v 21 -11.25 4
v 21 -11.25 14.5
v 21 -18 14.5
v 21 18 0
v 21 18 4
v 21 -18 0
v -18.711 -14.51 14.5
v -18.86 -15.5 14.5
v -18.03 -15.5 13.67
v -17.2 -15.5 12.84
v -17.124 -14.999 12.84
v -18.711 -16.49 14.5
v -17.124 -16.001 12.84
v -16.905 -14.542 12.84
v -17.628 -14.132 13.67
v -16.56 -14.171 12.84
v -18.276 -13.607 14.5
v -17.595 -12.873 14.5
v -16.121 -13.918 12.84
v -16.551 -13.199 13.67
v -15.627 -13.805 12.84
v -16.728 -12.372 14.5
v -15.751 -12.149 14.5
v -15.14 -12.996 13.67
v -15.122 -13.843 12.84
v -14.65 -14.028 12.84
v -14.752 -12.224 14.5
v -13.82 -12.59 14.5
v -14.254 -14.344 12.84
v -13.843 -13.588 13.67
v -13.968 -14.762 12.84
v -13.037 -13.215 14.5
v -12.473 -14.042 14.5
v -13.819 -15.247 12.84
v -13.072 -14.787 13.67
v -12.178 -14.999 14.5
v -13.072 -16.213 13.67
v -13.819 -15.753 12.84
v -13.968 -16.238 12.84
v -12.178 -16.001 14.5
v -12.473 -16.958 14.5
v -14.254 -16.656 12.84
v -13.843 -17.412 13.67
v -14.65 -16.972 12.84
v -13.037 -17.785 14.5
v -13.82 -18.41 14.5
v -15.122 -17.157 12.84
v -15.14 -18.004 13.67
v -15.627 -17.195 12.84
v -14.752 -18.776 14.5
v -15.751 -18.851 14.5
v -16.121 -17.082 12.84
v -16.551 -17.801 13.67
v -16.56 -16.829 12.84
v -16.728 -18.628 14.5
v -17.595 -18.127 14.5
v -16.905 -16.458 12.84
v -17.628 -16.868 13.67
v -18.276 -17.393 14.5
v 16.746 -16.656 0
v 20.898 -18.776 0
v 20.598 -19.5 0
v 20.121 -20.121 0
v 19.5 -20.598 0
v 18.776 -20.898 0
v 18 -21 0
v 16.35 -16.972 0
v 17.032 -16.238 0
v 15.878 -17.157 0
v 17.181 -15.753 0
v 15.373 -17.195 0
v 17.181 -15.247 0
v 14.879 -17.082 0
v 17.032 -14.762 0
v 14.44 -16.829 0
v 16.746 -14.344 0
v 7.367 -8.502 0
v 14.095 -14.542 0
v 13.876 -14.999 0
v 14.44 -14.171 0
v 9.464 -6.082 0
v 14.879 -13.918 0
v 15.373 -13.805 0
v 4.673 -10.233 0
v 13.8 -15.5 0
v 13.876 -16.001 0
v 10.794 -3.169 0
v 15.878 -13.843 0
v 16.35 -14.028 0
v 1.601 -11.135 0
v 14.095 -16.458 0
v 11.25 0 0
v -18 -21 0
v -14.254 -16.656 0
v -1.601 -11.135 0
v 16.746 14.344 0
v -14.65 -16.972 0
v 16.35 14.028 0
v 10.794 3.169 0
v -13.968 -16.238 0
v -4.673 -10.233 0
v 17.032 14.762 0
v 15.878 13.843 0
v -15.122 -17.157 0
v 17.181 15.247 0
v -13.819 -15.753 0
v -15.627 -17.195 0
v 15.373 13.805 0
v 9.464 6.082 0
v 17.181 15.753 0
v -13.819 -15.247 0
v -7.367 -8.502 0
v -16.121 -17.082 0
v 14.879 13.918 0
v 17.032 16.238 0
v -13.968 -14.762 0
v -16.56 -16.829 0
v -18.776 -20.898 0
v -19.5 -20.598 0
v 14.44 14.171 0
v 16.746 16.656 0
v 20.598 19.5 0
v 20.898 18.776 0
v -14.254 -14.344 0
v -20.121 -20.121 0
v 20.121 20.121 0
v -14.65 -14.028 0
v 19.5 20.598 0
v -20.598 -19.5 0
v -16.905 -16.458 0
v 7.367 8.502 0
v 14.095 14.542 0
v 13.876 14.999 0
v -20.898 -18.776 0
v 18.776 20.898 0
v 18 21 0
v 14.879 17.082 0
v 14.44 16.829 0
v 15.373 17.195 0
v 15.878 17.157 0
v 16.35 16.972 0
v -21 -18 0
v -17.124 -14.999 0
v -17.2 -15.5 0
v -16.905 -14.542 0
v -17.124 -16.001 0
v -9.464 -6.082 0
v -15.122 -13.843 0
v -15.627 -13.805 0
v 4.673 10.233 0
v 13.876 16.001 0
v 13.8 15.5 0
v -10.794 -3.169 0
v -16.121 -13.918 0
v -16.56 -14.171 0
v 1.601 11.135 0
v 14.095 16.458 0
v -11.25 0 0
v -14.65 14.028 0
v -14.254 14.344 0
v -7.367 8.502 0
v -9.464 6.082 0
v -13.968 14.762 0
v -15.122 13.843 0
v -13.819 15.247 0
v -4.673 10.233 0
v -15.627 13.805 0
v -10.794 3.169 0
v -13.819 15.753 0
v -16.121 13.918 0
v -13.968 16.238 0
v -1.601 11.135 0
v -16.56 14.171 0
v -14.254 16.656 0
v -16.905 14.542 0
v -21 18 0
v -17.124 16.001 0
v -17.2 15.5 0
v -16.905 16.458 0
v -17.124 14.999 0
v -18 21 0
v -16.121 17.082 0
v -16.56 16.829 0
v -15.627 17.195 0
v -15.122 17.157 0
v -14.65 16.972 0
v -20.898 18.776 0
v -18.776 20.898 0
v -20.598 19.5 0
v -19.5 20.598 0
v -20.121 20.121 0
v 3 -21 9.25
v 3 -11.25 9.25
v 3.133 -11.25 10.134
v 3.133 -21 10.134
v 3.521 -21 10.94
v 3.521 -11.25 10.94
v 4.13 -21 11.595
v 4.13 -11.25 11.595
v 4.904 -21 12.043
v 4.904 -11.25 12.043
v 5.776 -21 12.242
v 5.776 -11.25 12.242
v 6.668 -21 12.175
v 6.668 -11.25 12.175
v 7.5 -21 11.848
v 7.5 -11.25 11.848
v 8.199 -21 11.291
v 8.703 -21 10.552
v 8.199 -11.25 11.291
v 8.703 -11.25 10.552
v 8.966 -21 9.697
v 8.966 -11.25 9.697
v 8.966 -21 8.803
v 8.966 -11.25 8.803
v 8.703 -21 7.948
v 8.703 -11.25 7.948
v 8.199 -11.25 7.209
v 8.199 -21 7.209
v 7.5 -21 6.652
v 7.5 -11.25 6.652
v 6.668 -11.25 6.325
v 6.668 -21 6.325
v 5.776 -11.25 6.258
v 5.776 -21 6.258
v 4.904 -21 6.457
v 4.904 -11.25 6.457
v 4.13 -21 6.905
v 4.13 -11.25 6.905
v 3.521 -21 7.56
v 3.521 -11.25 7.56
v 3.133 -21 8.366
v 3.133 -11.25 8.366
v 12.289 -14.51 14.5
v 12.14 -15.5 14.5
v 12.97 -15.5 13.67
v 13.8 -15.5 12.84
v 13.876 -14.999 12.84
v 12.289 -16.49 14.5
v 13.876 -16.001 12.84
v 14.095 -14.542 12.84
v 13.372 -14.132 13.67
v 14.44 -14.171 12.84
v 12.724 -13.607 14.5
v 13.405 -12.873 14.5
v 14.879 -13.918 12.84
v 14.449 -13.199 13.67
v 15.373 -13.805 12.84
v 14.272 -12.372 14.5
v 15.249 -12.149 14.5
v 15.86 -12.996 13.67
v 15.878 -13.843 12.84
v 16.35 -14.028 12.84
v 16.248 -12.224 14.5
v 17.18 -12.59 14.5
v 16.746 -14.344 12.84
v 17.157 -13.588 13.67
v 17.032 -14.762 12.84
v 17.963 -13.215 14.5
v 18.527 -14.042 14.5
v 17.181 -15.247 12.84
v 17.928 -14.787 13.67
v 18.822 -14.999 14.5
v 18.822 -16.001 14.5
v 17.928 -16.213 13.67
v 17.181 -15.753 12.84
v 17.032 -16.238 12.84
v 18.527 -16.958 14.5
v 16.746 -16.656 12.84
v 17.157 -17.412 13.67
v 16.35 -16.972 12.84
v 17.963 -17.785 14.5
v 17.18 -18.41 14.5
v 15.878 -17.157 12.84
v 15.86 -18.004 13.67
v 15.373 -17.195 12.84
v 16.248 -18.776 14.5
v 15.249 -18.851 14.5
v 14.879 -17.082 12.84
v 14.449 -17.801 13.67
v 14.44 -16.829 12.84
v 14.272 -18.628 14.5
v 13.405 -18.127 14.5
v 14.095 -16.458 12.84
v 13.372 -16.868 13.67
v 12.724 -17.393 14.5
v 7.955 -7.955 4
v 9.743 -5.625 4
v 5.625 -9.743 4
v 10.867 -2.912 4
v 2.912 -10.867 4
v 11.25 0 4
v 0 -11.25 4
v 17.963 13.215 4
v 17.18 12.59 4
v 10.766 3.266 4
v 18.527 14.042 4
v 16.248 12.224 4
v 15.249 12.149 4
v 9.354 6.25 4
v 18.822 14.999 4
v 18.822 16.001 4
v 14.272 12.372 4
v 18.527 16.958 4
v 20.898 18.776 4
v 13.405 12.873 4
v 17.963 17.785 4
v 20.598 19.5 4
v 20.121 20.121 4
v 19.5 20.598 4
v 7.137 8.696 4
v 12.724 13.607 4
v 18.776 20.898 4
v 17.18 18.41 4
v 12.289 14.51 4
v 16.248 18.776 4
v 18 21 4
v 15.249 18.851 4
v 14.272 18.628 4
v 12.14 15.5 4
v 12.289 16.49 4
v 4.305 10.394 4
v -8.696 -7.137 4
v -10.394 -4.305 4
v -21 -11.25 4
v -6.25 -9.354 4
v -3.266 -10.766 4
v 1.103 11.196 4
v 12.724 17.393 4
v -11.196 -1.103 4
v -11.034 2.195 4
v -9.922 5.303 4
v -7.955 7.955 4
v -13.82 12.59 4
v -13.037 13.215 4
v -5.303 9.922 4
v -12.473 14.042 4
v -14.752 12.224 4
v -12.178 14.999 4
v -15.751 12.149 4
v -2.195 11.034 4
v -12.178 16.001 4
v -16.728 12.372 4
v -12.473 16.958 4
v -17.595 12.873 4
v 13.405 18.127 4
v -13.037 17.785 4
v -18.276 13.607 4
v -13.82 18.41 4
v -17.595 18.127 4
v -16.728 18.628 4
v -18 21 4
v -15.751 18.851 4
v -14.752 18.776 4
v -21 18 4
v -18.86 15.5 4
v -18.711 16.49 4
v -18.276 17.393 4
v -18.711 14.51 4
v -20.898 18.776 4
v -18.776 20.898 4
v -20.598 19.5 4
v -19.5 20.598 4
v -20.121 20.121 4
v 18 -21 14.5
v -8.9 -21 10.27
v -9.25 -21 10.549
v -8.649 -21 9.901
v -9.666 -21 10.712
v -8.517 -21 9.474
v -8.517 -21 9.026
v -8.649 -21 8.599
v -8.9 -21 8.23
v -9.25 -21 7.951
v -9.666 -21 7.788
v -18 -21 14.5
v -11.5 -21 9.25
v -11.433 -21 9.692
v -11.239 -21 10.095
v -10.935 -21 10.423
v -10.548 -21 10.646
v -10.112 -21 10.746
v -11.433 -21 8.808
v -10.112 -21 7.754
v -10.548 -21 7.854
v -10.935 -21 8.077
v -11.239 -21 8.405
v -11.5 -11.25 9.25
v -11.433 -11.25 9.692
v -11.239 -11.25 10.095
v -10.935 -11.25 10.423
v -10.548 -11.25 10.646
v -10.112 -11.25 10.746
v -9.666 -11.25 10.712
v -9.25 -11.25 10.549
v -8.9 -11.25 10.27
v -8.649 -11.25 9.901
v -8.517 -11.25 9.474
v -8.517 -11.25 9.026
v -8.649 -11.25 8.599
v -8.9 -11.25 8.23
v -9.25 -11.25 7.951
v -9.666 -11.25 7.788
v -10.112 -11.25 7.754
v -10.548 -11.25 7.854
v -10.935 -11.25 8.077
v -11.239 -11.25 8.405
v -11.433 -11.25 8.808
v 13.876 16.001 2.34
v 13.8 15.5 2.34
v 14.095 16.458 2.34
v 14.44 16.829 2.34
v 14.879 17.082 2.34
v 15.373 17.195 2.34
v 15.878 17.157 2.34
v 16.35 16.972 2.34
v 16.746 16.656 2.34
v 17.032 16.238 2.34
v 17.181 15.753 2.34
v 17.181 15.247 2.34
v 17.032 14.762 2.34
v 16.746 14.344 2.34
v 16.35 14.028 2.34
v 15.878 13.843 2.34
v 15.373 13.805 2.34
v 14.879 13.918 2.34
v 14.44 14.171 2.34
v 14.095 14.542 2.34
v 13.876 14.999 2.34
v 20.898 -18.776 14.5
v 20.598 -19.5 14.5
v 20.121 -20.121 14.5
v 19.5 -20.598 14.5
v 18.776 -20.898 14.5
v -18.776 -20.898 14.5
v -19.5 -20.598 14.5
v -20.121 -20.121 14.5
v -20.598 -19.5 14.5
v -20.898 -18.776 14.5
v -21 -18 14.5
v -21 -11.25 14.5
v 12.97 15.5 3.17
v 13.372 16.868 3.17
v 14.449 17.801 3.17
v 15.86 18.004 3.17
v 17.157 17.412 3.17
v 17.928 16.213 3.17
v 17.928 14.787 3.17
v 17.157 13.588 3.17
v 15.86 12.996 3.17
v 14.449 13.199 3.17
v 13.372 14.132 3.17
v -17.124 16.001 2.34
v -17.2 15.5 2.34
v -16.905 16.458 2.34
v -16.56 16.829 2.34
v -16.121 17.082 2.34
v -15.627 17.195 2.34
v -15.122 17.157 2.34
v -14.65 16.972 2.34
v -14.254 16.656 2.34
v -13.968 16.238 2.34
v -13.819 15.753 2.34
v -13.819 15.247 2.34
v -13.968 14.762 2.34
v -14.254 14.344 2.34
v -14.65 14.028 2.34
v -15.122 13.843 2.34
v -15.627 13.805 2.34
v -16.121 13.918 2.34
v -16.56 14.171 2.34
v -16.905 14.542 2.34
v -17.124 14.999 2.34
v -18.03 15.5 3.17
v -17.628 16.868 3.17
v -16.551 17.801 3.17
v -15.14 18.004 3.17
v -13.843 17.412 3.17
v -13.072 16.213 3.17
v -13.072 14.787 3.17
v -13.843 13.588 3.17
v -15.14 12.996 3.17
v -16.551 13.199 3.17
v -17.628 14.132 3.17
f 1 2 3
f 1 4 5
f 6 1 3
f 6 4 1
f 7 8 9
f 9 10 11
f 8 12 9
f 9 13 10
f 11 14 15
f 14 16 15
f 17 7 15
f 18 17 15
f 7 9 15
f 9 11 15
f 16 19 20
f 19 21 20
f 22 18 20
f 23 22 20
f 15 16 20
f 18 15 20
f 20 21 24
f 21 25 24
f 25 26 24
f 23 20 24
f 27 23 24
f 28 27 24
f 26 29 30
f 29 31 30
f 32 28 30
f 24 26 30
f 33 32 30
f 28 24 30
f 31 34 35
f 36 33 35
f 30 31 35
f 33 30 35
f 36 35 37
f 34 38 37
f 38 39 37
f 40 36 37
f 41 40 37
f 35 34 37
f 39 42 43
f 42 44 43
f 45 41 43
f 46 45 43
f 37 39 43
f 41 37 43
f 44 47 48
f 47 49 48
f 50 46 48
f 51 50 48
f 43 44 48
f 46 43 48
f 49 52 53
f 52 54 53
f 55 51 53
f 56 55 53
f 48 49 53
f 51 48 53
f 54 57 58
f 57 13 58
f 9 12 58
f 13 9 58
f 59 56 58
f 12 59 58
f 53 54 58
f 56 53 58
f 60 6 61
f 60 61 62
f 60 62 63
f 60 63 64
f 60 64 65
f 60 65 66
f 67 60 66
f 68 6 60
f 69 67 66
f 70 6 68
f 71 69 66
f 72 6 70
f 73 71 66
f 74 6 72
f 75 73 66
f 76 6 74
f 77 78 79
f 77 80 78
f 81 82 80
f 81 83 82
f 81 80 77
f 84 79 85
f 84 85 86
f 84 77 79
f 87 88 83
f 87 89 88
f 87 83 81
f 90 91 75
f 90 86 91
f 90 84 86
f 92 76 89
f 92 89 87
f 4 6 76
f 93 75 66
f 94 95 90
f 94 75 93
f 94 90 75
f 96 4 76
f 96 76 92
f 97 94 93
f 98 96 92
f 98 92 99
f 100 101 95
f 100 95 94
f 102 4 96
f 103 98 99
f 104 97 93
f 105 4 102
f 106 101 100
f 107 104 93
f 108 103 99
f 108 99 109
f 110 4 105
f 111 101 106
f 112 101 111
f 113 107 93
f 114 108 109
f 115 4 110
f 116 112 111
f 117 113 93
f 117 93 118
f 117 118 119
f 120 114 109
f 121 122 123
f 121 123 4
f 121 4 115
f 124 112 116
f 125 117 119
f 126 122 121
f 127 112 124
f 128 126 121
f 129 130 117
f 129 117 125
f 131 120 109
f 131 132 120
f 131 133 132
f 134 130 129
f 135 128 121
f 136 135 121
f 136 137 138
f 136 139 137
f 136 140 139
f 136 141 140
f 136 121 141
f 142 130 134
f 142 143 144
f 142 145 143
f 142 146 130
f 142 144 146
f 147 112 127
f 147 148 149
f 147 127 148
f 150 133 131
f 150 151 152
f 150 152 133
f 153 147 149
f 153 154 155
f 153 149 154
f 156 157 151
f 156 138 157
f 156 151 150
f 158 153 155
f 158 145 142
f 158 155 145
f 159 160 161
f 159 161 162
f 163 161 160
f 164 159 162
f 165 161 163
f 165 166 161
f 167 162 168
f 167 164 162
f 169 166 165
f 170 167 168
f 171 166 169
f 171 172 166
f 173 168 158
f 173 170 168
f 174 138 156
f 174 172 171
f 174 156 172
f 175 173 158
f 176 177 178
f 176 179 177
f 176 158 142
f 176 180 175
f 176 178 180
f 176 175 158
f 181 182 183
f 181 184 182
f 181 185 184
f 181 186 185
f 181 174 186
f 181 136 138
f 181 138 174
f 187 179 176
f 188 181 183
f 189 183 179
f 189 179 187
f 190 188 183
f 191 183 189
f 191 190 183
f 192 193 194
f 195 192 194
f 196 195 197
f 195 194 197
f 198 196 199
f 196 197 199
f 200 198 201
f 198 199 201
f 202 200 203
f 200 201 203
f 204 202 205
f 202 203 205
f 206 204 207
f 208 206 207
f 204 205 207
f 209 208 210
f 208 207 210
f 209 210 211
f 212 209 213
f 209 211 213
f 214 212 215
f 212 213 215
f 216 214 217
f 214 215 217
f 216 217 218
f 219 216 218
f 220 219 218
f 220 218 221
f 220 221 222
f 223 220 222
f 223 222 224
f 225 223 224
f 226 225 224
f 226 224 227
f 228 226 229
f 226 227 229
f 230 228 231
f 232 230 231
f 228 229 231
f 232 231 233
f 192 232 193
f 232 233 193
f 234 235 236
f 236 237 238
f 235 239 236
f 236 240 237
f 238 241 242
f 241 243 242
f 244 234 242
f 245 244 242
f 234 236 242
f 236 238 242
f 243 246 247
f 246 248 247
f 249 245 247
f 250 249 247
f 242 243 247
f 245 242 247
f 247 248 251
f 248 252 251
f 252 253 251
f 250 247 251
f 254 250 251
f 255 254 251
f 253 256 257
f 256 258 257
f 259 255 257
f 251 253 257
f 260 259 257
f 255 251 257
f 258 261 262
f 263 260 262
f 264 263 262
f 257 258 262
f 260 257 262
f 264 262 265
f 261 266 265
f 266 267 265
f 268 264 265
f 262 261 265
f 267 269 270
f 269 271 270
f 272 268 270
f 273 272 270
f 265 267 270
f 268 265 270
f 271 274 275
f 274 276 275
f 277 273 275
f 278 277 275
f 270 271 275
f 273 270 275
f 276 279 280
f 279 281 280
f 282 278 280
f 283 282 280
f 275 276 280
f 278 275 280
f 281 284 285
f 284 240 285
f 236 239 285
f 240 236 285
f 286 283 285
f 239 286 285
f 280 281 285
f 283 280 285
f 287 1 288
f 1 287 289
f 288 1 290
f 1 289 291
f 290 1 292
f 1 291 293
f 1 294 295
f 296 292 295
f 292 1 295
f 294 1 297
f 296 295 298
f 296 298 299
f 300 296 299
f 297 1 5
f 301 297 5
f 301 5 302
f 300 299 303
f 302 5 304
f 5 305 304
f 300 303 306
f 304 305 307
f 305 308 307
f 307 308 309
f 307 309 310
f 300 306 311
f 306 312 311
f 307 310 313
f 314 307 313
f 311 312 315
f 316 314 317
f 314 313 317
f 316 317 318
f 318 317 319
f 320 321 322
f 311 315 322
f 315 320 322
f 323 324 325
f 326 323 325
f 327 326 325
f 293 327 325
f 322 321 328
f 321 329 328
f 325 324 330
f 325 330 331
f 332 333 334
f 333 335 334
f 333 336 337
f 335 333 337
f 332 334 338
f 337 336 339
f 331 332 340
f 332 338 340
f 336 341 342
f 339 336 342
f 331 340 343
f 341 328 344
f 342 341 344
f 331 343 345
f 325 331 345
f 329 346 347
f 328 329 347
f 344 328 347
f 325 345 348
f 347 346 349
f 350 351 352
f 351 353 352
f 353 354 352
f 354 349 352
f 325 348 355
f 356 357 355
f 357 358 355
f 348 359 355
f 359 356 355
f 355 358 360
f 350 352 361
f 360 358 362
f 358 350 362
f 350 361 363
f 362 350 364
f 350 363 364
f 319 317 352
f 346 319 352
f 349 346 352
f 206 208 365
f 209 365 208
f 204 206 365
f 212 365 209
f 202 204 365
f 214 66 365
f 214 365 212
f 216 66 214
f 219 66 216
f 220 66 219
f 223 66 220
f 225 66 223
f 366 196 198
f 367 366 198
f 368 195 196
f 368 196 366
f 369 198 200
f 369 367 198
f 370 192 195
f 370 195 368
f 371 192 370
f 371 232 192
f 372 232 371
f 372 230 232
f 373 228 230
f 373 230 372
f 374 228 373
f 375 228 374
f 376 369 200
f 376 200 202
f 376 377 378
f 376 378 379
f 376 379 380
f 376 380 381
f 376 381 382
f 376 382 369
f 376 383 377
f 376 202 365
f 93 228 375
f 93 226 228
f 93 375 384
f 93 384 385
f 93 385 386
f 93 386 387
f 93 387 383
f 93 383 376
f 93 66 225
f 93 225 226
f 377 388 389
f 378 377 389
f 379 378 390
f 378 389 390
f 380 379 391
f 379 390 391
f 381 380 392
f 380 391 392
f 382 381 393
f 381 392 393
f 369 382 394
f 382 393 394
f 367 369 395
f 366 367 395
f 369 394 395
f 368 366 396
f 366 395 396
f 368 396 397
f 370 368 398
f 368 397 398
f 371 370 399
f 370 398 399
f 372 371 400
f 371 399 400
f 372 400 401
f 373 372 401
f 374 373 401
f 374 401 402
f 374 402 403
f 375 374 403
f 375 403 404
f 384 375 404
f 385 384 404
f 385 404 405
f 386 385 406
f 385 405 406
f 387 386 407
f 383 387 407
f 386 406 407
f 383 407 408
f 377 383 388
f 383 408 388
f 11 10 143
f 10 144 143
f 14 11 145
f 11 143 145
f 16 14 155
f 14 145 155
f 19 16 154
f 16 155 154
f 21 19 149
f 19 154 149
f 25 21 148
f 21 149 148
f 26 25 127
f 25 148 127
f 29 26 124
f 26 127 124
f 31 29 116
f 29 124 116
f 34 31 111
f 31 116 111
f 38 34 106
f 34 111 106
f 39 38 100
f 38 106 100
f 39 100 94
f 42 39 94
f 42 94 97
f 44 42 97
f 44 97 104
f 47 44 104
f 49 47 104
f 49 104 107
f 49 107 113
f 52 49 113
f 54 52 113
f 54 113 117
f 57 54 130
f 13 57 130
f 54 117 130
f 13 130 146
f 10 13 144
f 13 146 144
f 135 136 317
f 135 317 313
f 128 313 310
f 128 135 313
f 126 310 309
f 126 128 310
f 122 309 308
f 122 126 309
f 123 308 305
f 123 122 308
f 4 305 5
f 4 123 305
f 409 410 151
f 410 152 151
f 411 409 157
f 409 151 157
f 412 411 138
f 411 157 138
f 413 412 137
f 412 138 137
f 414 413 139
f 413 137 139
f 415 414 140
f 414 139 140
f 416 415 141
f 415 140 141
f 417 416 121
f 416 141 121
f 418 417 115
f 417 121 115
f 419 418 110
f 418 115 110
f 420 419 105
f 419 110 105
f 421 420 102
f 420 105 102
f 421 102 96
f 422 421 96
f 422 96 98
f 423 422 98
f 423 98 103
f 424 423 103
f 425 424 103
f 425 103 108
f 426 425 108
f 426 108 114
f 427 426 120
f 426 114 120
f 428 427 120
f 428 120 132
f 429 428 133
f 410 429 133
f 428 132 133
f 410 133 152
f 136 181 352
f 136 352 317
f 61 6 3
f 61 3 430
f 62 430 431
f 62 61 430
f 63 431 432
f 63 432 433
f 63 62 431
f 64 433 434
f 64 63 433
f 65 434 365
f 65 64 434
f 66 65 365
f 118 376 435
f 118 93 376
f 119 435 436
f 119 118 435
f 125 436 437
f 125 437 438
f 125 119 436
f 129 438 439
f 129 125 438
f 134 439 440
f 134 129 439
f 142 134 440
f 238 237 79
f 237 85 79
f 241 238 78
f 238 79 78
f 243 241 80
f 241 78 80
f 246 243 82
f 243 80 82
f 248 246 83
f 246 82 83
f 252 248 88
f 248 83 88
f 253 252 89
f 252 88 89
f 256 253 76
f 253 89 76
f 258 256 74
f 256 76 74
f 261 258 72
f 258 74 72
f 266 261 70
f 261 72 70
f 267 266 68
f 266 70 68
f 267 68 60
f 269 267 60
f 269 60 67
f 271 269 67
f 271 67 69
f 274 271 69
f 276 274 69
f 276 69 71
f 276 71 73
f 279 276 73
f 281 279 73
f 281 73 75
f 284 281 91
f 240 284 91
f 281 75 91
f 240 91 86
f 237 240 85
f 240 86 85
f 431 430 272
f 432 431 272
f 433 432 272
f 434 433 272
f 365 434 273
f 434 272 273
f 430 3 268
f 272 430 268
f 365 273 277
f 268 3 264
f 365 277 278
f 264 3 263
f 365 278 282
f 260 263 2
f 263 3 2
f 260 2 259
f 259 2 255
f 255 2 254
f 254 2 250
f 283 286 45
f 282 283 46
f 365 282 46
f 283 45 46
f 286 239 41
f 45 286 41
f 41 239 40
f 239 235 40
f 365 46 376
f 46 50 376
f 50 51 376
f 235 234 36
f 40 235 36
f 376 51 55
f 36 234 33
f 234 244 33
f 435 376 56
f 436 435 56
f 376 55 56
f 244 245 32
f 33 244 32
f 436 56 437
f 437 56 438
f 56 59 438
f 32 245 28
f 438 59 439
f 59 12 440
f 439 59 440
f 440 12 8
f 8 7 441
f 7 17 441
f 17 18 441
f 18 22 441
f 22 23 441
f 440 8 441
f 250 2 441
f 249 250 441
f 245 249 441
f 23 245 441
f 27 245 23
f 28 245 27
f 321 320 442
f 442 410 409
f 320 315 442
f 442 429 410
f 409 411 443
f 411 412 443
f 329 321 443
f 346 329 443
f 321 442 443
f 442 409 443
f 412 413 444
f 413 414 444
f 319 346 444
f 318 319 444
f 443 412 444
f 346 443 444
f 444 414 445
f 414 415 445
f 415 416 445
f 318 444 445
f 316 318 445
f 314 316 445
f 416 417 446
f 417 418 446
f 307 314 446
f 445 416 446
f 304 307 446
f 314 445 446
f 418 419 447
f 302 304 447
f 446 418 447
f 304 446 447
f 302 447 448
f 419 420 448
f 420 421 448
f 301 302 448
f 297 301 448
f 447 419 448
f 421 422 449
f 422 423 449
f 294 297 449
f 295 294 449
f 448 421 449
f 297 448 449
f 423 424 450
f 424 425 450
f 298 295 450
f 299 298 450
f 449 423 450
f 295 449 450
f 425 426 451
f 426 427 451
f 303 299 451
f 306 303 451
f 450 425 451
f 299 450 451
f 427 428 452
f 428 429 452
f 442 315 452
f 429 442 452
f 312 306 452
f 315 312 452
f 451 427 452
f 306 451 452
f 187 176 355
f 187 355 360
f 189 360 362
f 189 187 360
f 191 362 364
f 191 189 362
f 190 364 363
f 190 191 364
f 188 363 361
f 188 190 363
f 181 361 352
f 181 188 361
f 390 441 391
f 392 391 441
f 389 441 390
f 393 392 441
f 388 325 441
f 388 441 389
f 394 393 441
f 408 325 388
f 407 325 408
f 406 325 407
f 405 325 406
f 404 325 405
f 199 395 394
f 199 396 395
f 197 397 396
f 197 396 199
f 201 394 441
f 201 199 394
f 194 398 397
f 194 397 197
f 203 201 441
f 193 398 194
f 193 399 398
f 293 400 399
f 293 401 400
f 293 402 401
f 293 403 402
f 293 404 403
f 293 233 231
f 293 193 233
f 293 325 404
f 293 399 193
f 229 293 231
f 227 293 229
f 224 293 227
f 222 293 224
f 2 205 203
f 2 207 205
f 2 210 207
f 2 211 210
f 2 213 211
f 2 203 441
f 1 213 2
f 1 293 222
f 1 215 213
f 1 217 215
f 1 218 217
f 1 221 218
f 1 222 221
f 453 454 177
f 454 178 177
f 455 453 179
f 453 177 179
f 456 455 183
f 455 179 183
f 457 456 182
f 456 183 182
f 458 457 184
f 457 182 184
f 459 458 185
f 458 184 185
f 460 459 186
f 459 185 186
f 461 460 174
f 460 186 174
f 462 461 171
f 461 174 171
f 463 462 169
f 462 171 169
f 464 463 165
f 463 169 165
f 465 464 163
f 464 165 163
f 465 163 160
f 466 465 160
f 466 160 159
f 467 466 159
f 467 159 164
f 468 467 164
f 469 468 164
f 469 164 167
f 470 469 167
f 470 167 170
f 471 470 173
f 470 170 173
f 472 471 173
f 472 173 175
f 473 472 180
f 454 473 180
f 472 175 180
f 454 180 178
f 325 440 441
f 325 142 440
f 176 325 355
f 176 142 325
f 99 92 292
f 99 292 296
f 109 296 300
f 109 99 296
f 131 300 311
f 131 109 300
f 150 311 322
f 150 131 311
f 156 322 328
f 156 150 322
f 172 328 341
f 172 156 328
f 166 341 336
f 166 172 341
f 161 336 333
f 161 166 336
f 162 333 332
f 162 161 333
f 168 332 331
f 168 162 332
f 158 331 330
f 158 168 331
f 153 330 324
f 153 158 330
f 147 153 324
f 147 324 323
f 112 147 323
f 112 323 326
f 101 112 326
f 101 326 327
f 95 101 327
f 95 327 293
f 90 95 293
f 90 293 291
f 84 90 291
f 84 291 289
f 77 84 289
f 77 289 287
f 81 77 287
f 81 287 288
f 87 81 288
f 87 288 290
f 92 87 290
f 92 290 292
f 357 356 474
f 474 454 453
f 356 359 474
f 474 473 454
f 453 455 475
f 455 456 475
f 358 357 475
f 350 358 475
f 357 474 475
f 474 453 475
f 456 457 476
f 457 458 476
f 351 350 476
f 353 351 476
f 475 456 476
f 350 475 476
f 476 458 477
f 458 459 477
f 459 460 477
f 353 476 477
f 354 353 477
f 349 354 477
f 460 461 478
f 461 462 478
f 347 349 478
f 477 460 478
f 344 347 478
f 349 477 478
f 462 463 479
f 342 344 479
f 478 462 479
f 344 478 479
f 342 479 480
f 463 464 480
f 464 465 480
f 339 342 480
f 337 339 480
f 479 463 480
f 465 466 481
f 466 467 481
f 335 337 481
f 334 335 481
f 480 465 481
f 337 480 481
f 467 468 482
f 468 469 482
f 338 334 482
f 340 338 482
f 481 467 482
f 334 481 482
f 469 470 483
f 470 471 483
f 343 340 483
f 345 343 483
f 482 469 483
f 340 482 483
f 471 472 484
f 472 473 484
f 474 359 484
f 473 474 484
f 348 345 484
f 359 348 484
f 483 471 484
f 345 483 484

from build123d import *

# Parameters (mm, degrees)
CROQUIS1_R                                           = 1
CROQUIS1_R_2                                         = 11.25
SALIENTE_EXTRUIR1_DEPTH                              = 4
CROQUIS2_R                                           = 1
SALIENTE_EXTRUIR2_DEPTH                              = 10.5
CROQUIS3_R                                           = 3
CROQUIS3_R_2                                         = 1.5
CORTAR_EXTRUIR1_DEPTH                                = 9.75
REFRENTADO_PARA_TORNILLO_TAP_N_CON_CABEZ_D           = 3.4
REFRENTADO_PARA_TORNILLO_TAP_N_CON_CABEZ_CSINK_D     = 6.72
REFRENTADO_PARA_TORNILLO_TAP_N_CON_CABEZ_CSINK_ANGLE = 90
REFRENTADO_PARA_TORNILLO_TAP_N_CON_C_2_D             = 3.4
REFRENTADO_PARA_TORNILLO_TAP_N_CON_C_2_CSINK_D       = 6.72
REFRENTADO_PARA_TORNILLO_TAP_N_CON_C_2_CSINK_ANGLE   = 90


with BuildPart() as part:
    # Croquis1 → Saliente-Extruir1 (new body)
    with BuildSketch(Plane.XY):
        with BuildLine():
            Line((-18, 21), (18, 21))
            ThreePointArc((18, 21), (20.121320344, 20.121320344), (21, 18))
            Line((21, 18), (21, -18))
            ThreePointArc((21, -18), (20.121320344, -20.121320344), (18, -21))
            Line((18, -21), (-18, -21))
            ThreePointArc((-18, -21), (-20.121320344, -20.121320344), (-21, -18))
            Line((-21, -18), (-21, 18))
            ThreePointArc((-21, 18), (-20.121320344, 20.121320344), (-18, 21))
        make_face()
        with Locations((-15.5, 15.5)):
            Circle(CROQUIS1_R, mode=Mode.SUBTRACT)
        with Locations((15.5, 15.5)):
            Circle(CROQUIS1_R, mode=Mode.SUBTRACT)
        with Locations((15.5, -15.5)):
            Circle(CROQUIS1_R, mode=Mode.SUBTRACT)
        with Locations((-15.5, -15.5)):
            Circle(CROQUIS1_R, mode=Mode.SUBTRACT)
        Circle(CROQUIS1_R_2, mode=Mode.SUBTRACT)
    extrude(amount=SALIENTE_EXTRUIR1_DEPTH)

    # Croquis2 → Saliente-Extruir2 (add)
    with BuildSketch(Plane.XY.offset(4)):
        with BuildLine():
            Line((-21, -11.25), (21, -11.25))
            Line((21, -11.25), (21, -18))
            ThreePointArc((21, -18), (20.121320344, -20.121320344), (18, -21))
            Line((18, -21), (-18, -21))
            ThreePointArc((-18, -21), (-20.121320344, -20.121320344), (-21, -18))
            Line((-21, -18), (-21, -11.25))
        make_face()
        with Locations((15.5, -15.5)):
            Circle(CROQUIS2_R, mode=Mode.SUBTRACT)
        with Locations((-15.5, -15.5)):
            Circle(CROQUIS2_R, mode=Mode.SUBTRACT)
    extrude(amount=SALIENTE_EXTRUIR2_DEPTH)

    # Croquis3 → Cortar-Extruir1 (cut)
    with BuildSketch(Plane(origin=(0, -11.25, 0), x_dir=(1, 0, 0), z_dir=(0, 1, 0))):
        with Locations(Location((6, -9.25, 0), (0, 0, 180))):
            Circle(CROQUIS3_R)
        with Locations(Location((-10, -9.25, 0), (0, 0, 180))):
            Circle(CROQUIS3_R_2)
    extrude(amount=-CORTAR_EXTRUIR1_DEPTH, mode=Mode.SUBTRACT)

    # Refrentado para tornillo tap_n con cabez (through all)
    with Locations(Plane.XY.offset(4)):
        with Locations((-15.5, 15.5), (15.5, 15.5)):
            CounterSinkHole(REFRENTADO_PARA_TORNILLO_TAP_N_CON_CABEZ_D / 2, REFRENTADO_PARA_TORNILLO_TAP_N_CON_CABEZ_CSINK_D / 2, counter_sink_angle=REFRENTADO_PARA_TORNILLO_TAP_N_CON_CABEZ_CSINK_ANGLE)

    # Refrentado para tornillo tap_n con c 2 (through all)
    with Locations(Plane.XY.offset(14.5)):
        with Locations((-15.5, -15.5), (15.5, -15.5)):
            CounterSinkHole(REFRENTADO_PARA_TORNILLO_TAP_N_CON_C_2_D / 2, REFRENTADO_PARA_TORNILLO_TAP_N_CON_C_2_CSINK_D / 2, counter_sink_angle=REFRENTADO_PARA_TORNILLO_TAP_N_CON_C_2_CSINK_ANGLE)


solid = part.part
